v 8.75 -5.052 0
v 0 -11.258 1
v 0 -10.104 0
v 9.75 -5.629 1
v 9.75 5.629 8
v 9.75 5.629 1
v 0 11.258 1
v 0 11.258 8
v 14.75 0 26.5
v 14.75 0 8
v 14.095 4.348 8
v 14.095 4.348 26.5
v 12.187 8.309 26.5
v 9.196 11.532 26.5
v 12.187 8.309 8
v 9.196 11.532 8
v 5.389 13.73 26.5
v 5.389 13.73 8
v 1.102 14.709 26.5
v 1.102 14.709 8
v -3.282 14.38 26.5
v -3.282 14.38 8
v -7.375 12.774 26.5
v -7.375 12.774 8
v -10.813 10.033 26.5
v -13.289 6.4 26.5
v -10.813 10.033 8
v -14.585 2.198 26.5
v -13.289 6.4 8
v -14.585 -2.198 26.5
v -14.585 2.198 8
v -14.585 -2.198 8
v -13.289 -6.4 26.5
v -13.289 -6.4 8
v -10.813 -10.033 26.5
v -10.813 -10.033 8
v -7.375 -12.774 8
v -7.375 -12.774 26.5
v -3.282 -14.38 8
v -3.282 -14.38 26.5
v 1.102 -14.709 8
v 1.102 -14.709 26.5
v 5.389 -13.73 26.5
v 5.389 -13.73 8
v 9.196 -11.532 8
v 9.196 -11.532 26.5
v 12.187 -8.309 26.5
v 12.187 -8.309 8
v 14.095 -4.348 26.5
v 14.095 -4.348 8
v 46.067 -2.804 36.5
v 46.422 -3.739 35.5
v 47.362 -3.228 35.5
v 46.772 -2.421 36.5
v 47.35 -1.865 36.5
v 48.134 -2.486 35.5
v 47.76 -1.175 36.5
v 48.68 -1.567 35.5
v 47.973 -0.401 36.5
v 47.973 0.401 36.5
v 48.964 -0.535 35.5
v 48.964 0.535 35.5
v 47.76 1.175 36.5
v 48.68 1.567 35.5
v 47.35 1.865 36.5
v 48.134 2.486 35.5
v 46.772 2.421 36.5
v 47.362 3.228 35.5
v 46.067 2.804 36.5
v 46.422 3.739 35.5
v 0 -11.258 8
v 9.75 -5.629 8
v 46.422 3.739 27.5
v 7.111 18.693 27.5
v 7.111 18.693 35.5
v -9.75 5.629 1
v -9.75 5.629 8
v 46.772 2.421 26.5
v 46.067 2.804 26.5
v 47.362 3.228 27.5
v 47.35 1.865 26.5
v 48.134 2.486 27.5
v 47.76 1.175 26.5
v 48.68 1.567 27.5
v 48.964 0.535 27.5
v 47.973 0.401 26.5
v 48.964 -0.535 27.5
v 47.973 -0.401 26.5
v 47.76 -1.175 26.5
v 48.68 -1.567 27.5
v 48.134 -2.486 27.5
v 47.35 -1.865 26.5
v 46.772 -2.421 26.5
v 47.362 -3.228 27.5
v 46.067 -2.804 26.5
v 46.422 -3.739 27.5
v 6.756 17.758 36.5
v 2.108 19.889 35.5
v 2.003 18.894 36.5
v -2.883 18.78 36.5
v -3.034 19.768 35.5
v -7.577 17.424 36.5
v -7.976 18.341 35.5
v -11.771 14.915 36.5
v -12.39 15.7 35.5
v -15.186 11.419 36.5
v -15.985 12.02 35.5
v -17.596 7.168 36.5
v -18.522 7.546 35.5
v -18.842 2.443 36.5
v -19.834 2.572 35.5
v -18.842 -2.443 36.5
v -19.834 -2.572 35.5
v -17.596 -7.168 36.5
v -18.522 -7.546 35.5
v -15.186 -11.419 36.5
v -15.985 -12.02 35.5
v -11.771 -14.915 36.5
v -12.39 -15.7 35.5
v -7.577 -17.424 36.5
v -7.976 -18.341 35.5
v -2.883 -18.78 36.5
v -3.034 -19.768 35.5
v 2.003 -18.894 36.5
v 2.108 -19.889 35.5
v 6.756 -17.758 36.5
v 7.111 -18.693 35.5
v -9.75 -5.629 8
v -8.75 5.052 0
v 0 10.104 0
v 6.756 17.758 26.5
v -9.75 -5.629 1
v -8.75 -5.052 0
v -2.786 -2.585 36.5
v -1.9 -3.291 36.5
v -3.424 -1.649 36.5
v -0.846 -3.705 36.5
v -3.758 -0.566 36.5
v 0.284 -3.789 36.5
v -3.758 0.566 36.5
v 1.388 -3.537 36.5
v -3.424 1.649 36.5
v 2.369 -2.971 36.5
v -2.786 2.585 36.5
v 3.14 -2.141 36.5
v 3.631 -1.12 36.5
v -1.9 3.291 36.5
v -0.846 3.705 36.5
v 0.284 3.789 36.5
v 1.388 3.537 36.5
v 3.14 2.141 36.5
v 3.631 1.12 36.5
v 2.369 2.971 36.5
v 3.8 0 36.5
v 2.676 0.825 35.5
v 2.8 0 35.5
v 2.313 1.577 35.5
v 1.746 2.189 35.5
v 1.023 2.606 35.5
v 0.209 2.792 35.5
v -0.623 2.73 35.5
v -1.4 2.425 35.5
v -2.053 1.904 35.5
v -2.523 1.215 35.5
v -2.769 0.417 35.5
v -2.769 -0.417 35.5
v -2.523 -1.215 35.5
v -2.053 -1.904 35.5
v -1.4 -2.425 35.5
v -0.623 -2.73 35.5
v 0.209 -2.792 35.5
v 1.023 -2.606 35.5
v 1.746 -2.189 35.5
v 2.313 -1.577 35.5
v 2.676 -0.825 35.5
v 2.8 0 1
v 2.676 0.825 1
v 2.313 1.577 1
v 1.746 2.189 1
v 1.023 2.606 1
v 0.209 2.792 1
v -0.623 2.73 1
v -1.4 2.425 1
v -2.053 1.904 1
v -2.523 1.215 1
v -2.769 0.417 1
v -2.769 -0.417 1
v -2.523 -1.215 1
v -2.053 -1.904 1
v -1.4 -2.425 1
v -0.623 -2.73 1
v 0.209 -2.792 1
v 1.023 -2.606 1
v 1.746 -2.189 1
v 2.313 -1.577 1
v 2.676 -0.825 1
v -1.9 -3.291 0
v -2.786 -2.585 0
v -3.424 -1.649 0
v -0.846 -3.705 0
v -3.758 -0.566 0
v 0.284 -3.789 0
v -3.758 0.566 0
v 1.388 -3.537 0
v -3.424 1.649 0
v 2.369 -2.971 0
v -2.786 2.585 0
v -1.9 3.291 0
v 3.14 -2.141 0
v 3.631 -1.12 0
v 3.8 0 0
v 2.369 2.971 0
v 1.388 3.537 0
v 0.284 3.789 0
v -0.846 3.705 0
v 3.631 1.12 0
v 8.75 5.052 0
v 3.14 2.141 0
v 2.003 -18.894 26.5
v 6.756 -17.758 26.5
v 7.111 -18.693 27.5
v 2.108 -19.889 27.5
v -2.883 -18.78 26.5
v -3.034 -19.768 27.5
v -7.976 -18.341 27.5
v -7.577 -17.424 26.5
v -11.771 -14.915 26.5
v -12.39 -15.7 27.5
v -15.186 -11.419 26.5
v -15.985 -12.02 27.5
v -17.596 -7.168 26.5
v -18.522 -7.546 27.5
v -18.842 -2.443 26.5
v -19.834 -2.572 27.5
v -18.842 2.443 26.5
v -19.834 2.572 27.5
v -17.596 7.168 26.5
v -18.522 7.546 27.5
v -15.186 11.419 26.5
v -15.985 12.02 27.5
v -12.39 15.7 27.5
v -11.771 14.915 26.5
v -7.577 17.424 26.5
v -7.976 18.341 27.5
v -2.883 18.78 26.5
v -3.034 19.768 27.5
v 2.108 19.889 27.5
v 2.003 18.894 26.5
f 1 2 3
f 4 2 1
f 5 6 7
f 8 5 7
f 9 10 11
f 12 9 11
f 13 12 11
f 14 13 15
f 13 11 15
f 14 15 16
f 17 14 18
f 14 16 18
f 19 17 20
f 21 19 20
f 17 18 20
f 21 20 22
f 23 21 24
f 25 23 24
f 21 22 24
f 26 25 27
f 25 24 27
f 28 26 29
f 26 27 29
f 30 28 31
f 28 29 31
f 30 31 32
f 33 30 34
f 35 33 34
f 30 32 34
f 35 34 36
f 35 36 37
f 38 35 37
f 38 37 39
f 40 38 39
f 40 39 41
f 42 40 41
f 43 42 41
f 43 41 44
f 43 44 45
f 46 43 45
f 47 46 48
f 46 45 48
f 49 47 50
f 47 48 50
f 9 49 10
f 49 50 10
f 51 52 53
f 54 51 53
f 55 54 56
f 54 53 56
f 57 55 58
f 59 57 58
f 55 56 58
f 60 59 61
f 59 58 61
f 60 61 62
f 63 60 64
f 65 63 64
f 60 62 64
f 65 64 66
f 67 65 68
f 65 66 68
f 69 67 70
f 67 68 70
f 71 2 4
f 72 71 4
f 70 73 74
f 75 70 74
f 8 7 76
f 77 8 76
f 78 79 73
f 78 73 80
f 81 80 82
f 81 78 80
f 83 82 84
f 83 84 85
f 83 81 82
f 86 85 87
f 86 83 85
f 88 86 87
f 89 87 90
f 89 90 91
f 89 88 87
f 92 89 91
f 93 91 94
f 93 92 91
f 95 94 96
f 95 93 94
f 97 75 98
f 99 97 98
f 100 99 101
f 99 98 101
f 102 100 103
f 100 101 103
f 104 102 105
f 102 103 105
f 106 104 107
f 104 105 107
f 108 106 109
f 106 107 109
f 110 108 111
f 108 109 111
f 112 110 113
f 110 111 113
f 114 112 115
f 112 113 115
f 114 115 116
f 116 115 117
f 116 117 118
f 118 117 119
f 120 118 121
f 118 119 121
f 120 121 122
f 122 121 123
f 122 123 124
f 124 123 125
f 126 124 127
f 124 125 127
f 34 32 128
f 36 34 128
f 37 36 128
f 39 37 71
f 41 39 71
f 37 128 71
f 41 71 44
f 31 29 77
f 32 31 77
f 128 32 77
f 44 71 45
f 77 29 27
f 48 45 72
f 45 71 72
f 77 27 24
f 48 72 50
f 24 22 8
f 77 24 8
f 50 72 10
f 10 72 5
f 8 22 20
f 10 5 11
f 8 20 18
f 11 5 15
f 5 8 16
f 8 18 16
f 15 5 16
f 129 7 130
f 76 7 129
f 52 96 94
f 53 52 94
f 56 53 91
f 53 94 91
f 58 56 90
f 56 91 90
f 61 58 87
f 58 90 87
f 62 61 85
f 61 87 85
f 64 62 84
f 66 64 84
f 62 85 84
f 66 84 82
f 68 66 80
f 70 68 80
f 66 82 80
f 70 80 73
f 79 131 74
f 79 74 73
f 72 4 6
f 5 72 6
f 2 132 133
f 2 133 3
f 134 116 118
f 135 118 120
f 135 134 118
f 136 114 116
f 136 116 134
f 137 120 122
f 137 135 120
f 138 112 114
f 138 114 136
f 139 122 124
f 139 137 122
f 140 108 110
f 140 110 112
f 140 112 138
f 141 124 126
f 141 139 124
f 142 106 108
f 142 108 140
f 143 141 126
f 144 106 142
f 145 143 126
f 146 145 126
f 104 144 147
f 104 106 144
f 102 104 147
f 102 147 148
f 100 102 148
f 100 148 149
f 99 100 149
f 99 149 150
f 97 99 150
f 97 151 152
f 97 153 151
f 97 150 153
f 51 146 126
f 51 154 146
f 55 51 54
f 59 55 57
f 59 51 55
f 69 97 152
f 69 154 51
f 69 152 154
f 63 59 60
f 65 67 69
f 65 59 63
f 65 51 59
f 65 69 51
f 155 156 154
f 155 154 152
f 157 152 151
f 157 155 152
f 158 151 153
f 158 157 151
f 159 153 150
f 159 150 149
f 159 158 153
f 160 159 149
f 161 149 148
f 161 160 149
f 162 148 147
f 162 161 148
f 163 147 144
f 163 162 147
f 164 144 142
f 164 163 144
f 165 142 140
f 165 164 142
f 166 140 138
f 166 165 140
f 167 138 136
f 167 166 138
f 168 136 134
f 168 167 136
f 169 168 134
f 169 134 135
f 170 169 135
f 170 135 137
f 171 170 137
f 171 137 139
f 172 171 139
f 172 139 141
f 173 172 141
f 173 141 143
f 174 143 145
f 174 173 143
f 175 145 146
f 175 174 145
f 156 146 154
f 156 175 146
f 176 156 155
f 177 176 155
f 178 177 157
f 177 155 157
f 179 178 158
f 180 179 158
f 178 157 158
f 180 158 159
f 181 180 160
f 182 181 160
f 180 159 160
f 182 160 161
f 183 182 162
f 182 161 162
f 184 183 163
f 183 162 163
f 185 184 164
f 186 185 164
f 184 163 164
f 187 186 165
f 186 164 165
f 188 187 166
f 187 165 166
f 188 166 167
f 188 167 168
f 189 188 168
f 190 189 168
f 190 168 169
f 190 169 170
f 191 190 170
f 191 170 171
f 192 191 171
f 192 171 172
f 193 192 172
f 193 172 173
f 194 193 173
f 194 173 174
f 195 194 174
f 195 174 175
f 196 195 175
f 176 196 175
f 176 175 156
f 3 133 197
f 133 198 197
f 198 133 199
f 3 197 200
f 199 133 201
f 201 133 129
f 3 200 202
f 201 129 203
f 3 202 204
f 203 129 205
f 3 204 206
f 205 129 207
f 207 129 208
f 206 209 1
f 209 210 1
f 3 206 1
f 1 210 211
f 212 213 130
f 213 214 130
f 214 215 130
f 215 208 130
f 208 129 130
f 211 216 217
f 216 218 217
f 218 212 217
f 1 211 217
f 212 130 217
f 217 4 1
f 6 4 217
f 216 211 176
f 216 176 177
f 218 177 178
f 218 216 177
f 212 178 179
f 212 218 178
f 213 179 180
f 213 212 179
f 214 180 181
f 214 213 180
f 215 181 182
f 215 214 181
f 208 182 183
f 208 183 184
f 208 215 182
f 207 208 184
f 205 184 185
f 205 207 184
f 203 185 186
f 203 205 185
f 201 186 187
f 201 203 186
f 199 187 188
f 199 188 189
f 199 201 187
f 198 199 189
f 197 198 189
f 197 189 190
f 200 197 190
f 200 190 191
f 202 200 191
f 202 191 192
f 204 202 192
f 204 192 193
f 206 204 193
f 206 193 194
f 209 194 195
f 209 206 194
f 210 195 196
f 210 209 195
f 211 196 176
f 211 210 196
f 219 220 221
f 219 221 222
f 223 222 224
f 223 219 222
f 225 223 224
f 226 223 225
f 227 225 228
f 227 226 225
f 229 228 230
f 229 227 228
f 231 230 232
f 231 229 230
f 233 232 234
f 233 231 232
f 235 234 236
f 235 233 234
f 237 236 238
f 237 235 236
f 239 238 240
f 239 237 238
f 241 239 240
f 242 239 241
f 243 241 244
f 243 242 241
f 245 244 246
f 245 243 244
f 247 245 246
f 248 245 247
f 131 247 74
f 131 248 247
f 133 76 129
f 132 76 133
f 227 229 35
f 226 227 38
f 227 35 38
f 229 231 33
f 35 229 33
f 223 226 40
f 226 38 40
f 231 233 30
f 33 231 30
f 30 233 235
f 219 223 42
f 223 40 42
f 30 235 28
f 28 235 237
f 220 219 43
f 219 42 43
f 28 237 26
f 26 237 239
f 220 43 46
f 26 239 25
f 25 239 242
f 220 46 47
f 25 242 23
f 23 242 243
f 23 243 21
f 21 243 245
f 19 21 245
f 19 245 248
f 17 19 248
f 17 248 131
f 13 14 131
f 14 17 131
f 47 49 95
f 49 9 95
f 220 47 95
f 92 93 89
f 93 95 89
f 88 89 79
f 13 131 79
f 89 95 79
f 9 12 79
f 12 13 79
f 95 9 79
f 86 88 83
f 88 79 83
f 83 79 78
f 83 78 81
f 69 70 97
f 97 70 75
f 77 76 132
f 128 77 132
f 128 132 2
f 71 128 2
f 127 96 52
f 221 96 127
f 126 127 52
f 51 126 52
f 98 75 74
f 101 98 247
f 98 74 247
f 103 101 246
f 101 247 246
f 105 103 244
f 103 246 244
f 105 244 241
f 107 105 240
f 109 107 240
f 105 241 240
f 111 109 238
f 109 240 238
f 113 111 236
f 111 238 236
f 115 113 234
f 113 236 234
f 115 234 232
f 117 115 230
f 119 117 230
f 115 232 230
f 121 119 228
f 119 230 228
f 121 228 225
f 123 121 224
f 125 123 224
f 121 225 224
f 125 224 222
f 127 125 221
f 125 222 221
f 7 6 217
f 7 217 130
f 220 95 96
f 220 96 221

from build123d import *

# Parameters (mm, degrees)
PAD003_DEPTH    = 8
SKETCH007_R     = 14.75
PAD004_DEPTH    = 18.5
PAD005_DEPTH    = 10
SKETCH009_R     = 2.8
POCKET002_DEPTH = 36.501
CHAMFER_SIZE    = 1


with BuildPart() as part:
    # Sketch006 → Pad003 (new body)
    with BuildSketch(Plane.XY):
        Polygon((0, -11.25833), (9.75, -5.629165), (9.75, 5.629165), (0, 11.25833), (-9.75, 5.629165), (-9.75, -5.629165), align=None)
    extrude(amount=PAD003_DEPTH)

    # Sketch007 (on Face8 of Pad003) → Pad004 (join)
    with BuildSketch(Plane.XY.offset(8)):
        Circle(SKETCH007_R)
    extrude(amount=PAD004_DEPTH)

    # Sketch008 (on Face3 of Pad004) → Pad005 (join)
    with BuildSketch(Plane.XY.offset(26.5)):
        with BuildLine():
            ThreePointArc((7.111111, 18.693103), (-20, 0), (7.111111, -18.693103))
            Line((46.422222, -3.738621), (7.111111, -18.693103))
            ThreePointArc((46.422222, -3.738621), (49, 0), (46.422222, 3.738621))
            Line((46.422222, 3.738621), (7.111111, 18.693103))
        make_face()
    extrude(amount=PAD005_DEPTH)

    # Sketch009 (on Face5 of Pad005) → Pocket002 (cut, through all)
    with BuildSketch(Plane.XY.offset(36.5)):
        Circle(SKETCH009_R)
    extrude(amount=-POCKET002_DEPTH, mode=Mode.SUBTRACT)

    # Chamfer
    chamfer_edges = [part.edges().sort_by_distance(p)[0] for p in [
        (49, 0, 36.5),
        (26.766667, -11.215862, 36.5),
        (26.766667, 11.215862, 36.5),
        (-20, 0, 36.5),
        (-2.8, 0, 36.5),
        (26.766667, -11.215862, 26.5),
        (4.875, -8.443748, 0),
        (-4.875, -8.443748, 0),
        (9.75, 0, 0),
        (-9.75, 0, 0),
        (4.875, 8.443748, 0),
        (-4.875, 8.443748, 0),
        (-2.8, 0, 0),
    ]]
    chamfer(chamfer_edges, length=CHAMFER_SIZE)


solid = part.part
